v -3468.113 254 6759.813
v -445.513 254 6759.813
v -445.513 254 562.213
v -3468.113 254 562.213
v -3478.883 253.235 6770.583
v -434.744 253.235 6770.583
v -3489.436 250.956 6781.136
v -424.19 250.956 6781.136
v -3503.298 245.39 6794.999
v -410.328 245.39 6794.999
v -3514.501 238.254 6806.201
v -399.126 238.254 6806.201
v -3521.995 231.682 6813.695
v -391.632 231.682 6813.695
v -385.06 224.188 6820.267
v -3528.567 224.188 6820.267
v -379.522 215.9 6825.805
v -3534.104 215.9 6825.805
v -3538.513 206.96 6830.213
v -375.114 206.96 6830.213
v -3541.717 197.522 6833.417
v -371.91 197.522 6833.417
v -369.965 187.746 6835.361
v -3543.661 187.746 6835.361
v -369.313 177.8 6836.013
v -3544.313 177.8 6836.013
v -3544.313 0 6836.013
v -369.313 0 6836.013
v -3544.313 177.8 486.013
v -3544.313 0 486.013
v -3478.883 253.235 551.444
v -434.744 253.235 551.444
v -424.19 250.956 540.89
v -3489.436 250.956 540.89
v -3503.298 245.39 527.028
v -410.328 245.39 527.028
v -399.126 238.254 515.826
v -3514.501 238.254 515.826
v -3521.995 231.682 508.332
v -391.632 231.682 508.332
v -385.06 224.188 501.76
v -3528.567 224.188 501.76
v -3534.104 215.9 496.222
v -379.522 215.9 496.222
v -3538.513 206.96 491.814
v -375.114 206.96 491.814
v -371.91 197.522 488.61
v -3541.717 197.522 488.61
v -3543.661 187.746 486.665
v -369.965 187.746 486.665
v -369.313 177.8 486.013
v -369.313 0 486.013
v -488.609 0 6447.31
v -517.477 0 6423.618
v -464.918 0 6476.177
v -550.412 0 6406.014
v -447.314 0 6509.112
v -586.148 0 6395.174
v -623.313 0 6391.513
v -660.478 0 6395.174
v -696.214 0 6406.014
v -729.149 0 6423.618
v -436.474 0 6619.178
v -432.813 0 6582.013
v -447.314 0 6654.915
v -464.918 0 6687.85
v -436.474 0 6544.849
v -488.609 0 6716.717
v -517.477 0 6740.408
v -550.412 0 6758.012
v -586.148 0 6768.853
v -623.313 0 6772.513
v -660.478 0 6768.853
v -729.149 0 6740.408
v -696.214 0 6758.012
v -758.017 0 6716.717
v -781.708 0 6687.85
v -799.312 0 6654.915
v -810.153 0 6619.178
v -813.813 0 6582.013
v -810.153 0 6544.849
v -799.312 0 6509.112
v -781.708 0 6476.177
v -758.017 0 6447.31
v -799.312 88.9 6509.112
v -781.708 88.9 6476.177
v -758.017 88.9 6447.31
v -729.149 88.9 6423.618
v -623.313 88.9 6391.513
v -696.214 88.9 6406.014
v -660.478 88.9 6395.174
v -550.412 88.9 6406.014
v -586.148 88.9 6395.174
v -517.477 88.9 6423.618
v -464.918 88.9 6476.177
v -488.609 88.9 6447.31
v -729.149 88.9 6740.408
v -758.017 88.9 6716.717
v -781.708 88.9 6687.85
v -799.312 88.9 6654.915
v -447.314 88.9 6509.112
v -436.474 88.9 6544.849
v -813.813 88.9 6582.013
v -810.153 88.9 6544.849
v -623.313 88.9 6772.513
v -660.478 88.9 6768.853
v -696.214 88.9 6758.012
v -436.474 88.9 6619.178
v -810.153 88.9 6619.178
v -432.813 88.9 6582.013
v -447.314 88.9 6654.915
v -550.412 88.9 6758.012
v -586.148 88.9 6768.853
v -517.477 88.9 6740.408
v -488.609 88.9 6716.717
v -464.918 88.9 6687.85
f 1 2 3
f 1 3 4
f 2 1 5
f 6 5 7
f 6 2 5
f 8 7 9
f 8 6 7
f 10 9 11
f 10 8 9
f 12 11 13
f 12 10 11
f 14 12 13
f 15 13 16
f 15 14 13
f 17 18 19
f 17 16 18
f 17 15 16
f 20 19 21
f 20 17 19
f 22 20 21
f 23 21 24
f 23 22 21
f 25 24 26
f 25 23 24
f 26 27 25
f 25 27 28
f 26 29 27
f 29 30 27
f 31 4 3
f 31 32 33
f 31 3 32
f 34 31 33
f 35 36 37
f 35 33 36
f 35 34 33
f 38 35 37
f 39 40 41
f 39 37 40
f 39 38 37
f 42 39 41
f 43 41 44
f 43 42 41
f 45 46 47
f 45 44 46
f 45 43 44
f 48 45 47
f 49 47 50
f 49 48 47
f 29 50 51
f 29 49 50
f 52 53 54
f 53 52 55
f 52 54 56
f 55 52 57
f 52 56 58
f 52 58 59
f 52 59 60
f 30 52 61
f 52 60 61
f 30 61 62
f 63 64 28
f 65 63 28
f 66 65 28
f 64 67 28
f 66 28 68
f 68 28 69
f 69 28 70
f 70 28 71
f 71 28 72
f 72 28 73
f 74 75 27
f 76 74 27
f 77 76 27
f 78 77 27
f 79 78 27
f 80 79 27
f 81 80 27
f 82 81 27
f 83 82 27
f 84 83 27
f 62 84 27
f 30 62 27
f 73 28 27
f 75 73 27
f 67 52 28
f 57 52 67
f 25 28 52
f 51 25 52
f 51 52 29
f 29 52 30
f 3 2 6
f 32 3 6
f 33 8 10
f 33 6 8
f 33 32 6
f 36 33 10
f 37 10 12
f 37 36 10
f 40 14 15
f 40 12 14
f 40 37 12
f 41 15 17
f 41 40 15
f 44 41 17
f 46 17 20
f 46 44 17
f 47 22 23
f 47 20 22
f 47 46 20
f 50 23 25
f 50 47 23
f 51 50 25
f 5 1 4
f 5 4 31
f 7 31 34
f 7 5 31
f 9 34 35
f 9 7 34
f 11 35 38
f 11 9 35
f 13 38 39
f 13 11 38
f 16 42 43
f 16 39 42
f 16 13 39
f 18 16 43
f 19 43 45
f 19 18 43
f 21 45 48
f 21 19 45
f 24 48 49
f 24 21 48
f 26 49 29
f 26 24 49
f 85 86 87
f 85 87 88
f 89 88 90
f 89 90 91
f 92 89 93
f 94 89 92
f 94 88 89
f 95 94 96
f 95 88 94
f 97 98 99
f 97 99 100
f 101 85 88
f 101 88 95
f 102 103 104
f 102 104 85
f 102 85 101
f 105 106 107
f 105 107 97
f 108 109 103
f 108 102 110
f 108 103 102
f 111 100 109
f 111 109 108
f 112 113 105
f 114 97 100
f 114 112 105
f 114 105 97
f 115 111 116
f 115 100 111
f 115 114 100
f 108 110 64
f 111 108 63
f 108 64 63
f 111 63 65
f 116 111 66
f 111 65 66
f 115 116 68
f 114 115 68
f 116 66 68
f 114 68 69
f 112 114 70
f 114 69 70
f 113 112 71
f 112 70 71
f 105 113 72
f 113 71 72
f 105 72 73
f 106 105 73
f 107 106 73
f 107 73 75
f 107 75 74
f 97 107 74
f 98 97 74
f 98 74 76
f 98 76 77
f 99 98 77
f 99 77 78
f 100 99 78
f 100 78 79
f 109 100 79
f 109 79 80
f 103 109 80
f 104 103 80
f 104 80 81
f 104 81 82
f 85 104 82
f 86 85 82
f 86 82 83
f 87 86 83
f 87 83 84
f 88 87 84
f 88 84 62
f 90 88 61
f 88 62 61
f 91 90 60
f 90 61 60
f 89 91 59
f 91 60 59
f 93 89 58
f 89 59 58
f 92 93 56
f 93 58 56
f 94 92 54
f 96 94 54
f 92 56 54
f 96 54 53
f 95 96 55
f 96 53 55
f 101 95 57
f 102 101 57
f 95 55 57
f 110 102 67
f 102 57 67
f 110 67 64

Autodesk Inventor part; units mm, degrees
ref_plane "YZ Plane" through (0, 0, 0) normal (1, 0, 0) x (0, 1, 0)
ref_plane "XZ Plane" through (0, 0, 0) normal (0, 1, 0) x (-1, 0, 0)
ref_plane "XY Plane" through (0, 0, 0) normal (0, 0, 1) x (1, 0, 0)
sketch "Sketch1" plane through (0, 0, 0) normal (0, 1, 0) x (-1, 0, 0)
  line L0 (3544.3132, 6836.0134) -> (369.3132, 6836.0134)
  line L1 (369.3132, 6836.0134) -> (369.3132, 486.0134)
  line L2 (369.3132, 486.0134) -> (3544.3132, 486.0134)
  line L3 (3544.3132, 486.0134) -> (3544.3132, 6836.0134)
  point P0 (0, 0)
  dimension "d0" = 6350
  dimension "d1" = 3175
extrude "Extrusion1" add sketch "Sketch1" along normal blind 254
fillet "Fillet1" radius 76.2 4 edges at (-3544.3132, 254, 3661.0134) (-1956.8132, 254, 486.0134) (-369.3132, 254, 3661.0134) (-1956.8132, 254, 6836.0134)
sketch "Sketch2" plane through (0, 0, 0) normal (0, -1, 0) x (1, 0, 0)
  circle A0 centre (-623.3132, 6582.0134) radius 190.5
  line L0 (-3544.3132, 6836.0134) -> (-369.3132, 6836.0134) projected
  line L1 (-369.3132, 6836.0134) -> (-369.3132, 486.0134) projected
  line L2 (-369.3132, 6836.0134) -> (-369.3132, 486.0134) projected
  line L3 (-369.3132, 3661.0134) -> (-3544.3132, 3661.0134)
  line L4 (-3544.3132, 486.0134) -> (-3544.3132, 6836.0134) projected
  line L5 (-369.3132, 486.0134) -> (-3544.3132, 486.0134) projected
  line L6 (-1956.8132, 486.0134) -> (-1956.8132, 6836.0134)
  circle A1 centre (-623.3132, 740.0134) radius 190.5
  circle A2 centre (-3290.3132, 6582.0134) radius 190.5
  line L7 (-3544.3132, 6836.0134) -> (-3544.3132, 486.0134)
  circle A3 centre (-3290.3132, 740.0134) radius 190.5
  point P0 (0, 0)
  dimension "d4" = 381
  dimension "d5" = 254
  dimension "d6" = 254
extrude "Extrusion2" cut sketch "Sketch2" against normal blind 88.9 contours A0
equation "\"d1\" = 0.5 * d0"
equation "\"d6\" = d5"
